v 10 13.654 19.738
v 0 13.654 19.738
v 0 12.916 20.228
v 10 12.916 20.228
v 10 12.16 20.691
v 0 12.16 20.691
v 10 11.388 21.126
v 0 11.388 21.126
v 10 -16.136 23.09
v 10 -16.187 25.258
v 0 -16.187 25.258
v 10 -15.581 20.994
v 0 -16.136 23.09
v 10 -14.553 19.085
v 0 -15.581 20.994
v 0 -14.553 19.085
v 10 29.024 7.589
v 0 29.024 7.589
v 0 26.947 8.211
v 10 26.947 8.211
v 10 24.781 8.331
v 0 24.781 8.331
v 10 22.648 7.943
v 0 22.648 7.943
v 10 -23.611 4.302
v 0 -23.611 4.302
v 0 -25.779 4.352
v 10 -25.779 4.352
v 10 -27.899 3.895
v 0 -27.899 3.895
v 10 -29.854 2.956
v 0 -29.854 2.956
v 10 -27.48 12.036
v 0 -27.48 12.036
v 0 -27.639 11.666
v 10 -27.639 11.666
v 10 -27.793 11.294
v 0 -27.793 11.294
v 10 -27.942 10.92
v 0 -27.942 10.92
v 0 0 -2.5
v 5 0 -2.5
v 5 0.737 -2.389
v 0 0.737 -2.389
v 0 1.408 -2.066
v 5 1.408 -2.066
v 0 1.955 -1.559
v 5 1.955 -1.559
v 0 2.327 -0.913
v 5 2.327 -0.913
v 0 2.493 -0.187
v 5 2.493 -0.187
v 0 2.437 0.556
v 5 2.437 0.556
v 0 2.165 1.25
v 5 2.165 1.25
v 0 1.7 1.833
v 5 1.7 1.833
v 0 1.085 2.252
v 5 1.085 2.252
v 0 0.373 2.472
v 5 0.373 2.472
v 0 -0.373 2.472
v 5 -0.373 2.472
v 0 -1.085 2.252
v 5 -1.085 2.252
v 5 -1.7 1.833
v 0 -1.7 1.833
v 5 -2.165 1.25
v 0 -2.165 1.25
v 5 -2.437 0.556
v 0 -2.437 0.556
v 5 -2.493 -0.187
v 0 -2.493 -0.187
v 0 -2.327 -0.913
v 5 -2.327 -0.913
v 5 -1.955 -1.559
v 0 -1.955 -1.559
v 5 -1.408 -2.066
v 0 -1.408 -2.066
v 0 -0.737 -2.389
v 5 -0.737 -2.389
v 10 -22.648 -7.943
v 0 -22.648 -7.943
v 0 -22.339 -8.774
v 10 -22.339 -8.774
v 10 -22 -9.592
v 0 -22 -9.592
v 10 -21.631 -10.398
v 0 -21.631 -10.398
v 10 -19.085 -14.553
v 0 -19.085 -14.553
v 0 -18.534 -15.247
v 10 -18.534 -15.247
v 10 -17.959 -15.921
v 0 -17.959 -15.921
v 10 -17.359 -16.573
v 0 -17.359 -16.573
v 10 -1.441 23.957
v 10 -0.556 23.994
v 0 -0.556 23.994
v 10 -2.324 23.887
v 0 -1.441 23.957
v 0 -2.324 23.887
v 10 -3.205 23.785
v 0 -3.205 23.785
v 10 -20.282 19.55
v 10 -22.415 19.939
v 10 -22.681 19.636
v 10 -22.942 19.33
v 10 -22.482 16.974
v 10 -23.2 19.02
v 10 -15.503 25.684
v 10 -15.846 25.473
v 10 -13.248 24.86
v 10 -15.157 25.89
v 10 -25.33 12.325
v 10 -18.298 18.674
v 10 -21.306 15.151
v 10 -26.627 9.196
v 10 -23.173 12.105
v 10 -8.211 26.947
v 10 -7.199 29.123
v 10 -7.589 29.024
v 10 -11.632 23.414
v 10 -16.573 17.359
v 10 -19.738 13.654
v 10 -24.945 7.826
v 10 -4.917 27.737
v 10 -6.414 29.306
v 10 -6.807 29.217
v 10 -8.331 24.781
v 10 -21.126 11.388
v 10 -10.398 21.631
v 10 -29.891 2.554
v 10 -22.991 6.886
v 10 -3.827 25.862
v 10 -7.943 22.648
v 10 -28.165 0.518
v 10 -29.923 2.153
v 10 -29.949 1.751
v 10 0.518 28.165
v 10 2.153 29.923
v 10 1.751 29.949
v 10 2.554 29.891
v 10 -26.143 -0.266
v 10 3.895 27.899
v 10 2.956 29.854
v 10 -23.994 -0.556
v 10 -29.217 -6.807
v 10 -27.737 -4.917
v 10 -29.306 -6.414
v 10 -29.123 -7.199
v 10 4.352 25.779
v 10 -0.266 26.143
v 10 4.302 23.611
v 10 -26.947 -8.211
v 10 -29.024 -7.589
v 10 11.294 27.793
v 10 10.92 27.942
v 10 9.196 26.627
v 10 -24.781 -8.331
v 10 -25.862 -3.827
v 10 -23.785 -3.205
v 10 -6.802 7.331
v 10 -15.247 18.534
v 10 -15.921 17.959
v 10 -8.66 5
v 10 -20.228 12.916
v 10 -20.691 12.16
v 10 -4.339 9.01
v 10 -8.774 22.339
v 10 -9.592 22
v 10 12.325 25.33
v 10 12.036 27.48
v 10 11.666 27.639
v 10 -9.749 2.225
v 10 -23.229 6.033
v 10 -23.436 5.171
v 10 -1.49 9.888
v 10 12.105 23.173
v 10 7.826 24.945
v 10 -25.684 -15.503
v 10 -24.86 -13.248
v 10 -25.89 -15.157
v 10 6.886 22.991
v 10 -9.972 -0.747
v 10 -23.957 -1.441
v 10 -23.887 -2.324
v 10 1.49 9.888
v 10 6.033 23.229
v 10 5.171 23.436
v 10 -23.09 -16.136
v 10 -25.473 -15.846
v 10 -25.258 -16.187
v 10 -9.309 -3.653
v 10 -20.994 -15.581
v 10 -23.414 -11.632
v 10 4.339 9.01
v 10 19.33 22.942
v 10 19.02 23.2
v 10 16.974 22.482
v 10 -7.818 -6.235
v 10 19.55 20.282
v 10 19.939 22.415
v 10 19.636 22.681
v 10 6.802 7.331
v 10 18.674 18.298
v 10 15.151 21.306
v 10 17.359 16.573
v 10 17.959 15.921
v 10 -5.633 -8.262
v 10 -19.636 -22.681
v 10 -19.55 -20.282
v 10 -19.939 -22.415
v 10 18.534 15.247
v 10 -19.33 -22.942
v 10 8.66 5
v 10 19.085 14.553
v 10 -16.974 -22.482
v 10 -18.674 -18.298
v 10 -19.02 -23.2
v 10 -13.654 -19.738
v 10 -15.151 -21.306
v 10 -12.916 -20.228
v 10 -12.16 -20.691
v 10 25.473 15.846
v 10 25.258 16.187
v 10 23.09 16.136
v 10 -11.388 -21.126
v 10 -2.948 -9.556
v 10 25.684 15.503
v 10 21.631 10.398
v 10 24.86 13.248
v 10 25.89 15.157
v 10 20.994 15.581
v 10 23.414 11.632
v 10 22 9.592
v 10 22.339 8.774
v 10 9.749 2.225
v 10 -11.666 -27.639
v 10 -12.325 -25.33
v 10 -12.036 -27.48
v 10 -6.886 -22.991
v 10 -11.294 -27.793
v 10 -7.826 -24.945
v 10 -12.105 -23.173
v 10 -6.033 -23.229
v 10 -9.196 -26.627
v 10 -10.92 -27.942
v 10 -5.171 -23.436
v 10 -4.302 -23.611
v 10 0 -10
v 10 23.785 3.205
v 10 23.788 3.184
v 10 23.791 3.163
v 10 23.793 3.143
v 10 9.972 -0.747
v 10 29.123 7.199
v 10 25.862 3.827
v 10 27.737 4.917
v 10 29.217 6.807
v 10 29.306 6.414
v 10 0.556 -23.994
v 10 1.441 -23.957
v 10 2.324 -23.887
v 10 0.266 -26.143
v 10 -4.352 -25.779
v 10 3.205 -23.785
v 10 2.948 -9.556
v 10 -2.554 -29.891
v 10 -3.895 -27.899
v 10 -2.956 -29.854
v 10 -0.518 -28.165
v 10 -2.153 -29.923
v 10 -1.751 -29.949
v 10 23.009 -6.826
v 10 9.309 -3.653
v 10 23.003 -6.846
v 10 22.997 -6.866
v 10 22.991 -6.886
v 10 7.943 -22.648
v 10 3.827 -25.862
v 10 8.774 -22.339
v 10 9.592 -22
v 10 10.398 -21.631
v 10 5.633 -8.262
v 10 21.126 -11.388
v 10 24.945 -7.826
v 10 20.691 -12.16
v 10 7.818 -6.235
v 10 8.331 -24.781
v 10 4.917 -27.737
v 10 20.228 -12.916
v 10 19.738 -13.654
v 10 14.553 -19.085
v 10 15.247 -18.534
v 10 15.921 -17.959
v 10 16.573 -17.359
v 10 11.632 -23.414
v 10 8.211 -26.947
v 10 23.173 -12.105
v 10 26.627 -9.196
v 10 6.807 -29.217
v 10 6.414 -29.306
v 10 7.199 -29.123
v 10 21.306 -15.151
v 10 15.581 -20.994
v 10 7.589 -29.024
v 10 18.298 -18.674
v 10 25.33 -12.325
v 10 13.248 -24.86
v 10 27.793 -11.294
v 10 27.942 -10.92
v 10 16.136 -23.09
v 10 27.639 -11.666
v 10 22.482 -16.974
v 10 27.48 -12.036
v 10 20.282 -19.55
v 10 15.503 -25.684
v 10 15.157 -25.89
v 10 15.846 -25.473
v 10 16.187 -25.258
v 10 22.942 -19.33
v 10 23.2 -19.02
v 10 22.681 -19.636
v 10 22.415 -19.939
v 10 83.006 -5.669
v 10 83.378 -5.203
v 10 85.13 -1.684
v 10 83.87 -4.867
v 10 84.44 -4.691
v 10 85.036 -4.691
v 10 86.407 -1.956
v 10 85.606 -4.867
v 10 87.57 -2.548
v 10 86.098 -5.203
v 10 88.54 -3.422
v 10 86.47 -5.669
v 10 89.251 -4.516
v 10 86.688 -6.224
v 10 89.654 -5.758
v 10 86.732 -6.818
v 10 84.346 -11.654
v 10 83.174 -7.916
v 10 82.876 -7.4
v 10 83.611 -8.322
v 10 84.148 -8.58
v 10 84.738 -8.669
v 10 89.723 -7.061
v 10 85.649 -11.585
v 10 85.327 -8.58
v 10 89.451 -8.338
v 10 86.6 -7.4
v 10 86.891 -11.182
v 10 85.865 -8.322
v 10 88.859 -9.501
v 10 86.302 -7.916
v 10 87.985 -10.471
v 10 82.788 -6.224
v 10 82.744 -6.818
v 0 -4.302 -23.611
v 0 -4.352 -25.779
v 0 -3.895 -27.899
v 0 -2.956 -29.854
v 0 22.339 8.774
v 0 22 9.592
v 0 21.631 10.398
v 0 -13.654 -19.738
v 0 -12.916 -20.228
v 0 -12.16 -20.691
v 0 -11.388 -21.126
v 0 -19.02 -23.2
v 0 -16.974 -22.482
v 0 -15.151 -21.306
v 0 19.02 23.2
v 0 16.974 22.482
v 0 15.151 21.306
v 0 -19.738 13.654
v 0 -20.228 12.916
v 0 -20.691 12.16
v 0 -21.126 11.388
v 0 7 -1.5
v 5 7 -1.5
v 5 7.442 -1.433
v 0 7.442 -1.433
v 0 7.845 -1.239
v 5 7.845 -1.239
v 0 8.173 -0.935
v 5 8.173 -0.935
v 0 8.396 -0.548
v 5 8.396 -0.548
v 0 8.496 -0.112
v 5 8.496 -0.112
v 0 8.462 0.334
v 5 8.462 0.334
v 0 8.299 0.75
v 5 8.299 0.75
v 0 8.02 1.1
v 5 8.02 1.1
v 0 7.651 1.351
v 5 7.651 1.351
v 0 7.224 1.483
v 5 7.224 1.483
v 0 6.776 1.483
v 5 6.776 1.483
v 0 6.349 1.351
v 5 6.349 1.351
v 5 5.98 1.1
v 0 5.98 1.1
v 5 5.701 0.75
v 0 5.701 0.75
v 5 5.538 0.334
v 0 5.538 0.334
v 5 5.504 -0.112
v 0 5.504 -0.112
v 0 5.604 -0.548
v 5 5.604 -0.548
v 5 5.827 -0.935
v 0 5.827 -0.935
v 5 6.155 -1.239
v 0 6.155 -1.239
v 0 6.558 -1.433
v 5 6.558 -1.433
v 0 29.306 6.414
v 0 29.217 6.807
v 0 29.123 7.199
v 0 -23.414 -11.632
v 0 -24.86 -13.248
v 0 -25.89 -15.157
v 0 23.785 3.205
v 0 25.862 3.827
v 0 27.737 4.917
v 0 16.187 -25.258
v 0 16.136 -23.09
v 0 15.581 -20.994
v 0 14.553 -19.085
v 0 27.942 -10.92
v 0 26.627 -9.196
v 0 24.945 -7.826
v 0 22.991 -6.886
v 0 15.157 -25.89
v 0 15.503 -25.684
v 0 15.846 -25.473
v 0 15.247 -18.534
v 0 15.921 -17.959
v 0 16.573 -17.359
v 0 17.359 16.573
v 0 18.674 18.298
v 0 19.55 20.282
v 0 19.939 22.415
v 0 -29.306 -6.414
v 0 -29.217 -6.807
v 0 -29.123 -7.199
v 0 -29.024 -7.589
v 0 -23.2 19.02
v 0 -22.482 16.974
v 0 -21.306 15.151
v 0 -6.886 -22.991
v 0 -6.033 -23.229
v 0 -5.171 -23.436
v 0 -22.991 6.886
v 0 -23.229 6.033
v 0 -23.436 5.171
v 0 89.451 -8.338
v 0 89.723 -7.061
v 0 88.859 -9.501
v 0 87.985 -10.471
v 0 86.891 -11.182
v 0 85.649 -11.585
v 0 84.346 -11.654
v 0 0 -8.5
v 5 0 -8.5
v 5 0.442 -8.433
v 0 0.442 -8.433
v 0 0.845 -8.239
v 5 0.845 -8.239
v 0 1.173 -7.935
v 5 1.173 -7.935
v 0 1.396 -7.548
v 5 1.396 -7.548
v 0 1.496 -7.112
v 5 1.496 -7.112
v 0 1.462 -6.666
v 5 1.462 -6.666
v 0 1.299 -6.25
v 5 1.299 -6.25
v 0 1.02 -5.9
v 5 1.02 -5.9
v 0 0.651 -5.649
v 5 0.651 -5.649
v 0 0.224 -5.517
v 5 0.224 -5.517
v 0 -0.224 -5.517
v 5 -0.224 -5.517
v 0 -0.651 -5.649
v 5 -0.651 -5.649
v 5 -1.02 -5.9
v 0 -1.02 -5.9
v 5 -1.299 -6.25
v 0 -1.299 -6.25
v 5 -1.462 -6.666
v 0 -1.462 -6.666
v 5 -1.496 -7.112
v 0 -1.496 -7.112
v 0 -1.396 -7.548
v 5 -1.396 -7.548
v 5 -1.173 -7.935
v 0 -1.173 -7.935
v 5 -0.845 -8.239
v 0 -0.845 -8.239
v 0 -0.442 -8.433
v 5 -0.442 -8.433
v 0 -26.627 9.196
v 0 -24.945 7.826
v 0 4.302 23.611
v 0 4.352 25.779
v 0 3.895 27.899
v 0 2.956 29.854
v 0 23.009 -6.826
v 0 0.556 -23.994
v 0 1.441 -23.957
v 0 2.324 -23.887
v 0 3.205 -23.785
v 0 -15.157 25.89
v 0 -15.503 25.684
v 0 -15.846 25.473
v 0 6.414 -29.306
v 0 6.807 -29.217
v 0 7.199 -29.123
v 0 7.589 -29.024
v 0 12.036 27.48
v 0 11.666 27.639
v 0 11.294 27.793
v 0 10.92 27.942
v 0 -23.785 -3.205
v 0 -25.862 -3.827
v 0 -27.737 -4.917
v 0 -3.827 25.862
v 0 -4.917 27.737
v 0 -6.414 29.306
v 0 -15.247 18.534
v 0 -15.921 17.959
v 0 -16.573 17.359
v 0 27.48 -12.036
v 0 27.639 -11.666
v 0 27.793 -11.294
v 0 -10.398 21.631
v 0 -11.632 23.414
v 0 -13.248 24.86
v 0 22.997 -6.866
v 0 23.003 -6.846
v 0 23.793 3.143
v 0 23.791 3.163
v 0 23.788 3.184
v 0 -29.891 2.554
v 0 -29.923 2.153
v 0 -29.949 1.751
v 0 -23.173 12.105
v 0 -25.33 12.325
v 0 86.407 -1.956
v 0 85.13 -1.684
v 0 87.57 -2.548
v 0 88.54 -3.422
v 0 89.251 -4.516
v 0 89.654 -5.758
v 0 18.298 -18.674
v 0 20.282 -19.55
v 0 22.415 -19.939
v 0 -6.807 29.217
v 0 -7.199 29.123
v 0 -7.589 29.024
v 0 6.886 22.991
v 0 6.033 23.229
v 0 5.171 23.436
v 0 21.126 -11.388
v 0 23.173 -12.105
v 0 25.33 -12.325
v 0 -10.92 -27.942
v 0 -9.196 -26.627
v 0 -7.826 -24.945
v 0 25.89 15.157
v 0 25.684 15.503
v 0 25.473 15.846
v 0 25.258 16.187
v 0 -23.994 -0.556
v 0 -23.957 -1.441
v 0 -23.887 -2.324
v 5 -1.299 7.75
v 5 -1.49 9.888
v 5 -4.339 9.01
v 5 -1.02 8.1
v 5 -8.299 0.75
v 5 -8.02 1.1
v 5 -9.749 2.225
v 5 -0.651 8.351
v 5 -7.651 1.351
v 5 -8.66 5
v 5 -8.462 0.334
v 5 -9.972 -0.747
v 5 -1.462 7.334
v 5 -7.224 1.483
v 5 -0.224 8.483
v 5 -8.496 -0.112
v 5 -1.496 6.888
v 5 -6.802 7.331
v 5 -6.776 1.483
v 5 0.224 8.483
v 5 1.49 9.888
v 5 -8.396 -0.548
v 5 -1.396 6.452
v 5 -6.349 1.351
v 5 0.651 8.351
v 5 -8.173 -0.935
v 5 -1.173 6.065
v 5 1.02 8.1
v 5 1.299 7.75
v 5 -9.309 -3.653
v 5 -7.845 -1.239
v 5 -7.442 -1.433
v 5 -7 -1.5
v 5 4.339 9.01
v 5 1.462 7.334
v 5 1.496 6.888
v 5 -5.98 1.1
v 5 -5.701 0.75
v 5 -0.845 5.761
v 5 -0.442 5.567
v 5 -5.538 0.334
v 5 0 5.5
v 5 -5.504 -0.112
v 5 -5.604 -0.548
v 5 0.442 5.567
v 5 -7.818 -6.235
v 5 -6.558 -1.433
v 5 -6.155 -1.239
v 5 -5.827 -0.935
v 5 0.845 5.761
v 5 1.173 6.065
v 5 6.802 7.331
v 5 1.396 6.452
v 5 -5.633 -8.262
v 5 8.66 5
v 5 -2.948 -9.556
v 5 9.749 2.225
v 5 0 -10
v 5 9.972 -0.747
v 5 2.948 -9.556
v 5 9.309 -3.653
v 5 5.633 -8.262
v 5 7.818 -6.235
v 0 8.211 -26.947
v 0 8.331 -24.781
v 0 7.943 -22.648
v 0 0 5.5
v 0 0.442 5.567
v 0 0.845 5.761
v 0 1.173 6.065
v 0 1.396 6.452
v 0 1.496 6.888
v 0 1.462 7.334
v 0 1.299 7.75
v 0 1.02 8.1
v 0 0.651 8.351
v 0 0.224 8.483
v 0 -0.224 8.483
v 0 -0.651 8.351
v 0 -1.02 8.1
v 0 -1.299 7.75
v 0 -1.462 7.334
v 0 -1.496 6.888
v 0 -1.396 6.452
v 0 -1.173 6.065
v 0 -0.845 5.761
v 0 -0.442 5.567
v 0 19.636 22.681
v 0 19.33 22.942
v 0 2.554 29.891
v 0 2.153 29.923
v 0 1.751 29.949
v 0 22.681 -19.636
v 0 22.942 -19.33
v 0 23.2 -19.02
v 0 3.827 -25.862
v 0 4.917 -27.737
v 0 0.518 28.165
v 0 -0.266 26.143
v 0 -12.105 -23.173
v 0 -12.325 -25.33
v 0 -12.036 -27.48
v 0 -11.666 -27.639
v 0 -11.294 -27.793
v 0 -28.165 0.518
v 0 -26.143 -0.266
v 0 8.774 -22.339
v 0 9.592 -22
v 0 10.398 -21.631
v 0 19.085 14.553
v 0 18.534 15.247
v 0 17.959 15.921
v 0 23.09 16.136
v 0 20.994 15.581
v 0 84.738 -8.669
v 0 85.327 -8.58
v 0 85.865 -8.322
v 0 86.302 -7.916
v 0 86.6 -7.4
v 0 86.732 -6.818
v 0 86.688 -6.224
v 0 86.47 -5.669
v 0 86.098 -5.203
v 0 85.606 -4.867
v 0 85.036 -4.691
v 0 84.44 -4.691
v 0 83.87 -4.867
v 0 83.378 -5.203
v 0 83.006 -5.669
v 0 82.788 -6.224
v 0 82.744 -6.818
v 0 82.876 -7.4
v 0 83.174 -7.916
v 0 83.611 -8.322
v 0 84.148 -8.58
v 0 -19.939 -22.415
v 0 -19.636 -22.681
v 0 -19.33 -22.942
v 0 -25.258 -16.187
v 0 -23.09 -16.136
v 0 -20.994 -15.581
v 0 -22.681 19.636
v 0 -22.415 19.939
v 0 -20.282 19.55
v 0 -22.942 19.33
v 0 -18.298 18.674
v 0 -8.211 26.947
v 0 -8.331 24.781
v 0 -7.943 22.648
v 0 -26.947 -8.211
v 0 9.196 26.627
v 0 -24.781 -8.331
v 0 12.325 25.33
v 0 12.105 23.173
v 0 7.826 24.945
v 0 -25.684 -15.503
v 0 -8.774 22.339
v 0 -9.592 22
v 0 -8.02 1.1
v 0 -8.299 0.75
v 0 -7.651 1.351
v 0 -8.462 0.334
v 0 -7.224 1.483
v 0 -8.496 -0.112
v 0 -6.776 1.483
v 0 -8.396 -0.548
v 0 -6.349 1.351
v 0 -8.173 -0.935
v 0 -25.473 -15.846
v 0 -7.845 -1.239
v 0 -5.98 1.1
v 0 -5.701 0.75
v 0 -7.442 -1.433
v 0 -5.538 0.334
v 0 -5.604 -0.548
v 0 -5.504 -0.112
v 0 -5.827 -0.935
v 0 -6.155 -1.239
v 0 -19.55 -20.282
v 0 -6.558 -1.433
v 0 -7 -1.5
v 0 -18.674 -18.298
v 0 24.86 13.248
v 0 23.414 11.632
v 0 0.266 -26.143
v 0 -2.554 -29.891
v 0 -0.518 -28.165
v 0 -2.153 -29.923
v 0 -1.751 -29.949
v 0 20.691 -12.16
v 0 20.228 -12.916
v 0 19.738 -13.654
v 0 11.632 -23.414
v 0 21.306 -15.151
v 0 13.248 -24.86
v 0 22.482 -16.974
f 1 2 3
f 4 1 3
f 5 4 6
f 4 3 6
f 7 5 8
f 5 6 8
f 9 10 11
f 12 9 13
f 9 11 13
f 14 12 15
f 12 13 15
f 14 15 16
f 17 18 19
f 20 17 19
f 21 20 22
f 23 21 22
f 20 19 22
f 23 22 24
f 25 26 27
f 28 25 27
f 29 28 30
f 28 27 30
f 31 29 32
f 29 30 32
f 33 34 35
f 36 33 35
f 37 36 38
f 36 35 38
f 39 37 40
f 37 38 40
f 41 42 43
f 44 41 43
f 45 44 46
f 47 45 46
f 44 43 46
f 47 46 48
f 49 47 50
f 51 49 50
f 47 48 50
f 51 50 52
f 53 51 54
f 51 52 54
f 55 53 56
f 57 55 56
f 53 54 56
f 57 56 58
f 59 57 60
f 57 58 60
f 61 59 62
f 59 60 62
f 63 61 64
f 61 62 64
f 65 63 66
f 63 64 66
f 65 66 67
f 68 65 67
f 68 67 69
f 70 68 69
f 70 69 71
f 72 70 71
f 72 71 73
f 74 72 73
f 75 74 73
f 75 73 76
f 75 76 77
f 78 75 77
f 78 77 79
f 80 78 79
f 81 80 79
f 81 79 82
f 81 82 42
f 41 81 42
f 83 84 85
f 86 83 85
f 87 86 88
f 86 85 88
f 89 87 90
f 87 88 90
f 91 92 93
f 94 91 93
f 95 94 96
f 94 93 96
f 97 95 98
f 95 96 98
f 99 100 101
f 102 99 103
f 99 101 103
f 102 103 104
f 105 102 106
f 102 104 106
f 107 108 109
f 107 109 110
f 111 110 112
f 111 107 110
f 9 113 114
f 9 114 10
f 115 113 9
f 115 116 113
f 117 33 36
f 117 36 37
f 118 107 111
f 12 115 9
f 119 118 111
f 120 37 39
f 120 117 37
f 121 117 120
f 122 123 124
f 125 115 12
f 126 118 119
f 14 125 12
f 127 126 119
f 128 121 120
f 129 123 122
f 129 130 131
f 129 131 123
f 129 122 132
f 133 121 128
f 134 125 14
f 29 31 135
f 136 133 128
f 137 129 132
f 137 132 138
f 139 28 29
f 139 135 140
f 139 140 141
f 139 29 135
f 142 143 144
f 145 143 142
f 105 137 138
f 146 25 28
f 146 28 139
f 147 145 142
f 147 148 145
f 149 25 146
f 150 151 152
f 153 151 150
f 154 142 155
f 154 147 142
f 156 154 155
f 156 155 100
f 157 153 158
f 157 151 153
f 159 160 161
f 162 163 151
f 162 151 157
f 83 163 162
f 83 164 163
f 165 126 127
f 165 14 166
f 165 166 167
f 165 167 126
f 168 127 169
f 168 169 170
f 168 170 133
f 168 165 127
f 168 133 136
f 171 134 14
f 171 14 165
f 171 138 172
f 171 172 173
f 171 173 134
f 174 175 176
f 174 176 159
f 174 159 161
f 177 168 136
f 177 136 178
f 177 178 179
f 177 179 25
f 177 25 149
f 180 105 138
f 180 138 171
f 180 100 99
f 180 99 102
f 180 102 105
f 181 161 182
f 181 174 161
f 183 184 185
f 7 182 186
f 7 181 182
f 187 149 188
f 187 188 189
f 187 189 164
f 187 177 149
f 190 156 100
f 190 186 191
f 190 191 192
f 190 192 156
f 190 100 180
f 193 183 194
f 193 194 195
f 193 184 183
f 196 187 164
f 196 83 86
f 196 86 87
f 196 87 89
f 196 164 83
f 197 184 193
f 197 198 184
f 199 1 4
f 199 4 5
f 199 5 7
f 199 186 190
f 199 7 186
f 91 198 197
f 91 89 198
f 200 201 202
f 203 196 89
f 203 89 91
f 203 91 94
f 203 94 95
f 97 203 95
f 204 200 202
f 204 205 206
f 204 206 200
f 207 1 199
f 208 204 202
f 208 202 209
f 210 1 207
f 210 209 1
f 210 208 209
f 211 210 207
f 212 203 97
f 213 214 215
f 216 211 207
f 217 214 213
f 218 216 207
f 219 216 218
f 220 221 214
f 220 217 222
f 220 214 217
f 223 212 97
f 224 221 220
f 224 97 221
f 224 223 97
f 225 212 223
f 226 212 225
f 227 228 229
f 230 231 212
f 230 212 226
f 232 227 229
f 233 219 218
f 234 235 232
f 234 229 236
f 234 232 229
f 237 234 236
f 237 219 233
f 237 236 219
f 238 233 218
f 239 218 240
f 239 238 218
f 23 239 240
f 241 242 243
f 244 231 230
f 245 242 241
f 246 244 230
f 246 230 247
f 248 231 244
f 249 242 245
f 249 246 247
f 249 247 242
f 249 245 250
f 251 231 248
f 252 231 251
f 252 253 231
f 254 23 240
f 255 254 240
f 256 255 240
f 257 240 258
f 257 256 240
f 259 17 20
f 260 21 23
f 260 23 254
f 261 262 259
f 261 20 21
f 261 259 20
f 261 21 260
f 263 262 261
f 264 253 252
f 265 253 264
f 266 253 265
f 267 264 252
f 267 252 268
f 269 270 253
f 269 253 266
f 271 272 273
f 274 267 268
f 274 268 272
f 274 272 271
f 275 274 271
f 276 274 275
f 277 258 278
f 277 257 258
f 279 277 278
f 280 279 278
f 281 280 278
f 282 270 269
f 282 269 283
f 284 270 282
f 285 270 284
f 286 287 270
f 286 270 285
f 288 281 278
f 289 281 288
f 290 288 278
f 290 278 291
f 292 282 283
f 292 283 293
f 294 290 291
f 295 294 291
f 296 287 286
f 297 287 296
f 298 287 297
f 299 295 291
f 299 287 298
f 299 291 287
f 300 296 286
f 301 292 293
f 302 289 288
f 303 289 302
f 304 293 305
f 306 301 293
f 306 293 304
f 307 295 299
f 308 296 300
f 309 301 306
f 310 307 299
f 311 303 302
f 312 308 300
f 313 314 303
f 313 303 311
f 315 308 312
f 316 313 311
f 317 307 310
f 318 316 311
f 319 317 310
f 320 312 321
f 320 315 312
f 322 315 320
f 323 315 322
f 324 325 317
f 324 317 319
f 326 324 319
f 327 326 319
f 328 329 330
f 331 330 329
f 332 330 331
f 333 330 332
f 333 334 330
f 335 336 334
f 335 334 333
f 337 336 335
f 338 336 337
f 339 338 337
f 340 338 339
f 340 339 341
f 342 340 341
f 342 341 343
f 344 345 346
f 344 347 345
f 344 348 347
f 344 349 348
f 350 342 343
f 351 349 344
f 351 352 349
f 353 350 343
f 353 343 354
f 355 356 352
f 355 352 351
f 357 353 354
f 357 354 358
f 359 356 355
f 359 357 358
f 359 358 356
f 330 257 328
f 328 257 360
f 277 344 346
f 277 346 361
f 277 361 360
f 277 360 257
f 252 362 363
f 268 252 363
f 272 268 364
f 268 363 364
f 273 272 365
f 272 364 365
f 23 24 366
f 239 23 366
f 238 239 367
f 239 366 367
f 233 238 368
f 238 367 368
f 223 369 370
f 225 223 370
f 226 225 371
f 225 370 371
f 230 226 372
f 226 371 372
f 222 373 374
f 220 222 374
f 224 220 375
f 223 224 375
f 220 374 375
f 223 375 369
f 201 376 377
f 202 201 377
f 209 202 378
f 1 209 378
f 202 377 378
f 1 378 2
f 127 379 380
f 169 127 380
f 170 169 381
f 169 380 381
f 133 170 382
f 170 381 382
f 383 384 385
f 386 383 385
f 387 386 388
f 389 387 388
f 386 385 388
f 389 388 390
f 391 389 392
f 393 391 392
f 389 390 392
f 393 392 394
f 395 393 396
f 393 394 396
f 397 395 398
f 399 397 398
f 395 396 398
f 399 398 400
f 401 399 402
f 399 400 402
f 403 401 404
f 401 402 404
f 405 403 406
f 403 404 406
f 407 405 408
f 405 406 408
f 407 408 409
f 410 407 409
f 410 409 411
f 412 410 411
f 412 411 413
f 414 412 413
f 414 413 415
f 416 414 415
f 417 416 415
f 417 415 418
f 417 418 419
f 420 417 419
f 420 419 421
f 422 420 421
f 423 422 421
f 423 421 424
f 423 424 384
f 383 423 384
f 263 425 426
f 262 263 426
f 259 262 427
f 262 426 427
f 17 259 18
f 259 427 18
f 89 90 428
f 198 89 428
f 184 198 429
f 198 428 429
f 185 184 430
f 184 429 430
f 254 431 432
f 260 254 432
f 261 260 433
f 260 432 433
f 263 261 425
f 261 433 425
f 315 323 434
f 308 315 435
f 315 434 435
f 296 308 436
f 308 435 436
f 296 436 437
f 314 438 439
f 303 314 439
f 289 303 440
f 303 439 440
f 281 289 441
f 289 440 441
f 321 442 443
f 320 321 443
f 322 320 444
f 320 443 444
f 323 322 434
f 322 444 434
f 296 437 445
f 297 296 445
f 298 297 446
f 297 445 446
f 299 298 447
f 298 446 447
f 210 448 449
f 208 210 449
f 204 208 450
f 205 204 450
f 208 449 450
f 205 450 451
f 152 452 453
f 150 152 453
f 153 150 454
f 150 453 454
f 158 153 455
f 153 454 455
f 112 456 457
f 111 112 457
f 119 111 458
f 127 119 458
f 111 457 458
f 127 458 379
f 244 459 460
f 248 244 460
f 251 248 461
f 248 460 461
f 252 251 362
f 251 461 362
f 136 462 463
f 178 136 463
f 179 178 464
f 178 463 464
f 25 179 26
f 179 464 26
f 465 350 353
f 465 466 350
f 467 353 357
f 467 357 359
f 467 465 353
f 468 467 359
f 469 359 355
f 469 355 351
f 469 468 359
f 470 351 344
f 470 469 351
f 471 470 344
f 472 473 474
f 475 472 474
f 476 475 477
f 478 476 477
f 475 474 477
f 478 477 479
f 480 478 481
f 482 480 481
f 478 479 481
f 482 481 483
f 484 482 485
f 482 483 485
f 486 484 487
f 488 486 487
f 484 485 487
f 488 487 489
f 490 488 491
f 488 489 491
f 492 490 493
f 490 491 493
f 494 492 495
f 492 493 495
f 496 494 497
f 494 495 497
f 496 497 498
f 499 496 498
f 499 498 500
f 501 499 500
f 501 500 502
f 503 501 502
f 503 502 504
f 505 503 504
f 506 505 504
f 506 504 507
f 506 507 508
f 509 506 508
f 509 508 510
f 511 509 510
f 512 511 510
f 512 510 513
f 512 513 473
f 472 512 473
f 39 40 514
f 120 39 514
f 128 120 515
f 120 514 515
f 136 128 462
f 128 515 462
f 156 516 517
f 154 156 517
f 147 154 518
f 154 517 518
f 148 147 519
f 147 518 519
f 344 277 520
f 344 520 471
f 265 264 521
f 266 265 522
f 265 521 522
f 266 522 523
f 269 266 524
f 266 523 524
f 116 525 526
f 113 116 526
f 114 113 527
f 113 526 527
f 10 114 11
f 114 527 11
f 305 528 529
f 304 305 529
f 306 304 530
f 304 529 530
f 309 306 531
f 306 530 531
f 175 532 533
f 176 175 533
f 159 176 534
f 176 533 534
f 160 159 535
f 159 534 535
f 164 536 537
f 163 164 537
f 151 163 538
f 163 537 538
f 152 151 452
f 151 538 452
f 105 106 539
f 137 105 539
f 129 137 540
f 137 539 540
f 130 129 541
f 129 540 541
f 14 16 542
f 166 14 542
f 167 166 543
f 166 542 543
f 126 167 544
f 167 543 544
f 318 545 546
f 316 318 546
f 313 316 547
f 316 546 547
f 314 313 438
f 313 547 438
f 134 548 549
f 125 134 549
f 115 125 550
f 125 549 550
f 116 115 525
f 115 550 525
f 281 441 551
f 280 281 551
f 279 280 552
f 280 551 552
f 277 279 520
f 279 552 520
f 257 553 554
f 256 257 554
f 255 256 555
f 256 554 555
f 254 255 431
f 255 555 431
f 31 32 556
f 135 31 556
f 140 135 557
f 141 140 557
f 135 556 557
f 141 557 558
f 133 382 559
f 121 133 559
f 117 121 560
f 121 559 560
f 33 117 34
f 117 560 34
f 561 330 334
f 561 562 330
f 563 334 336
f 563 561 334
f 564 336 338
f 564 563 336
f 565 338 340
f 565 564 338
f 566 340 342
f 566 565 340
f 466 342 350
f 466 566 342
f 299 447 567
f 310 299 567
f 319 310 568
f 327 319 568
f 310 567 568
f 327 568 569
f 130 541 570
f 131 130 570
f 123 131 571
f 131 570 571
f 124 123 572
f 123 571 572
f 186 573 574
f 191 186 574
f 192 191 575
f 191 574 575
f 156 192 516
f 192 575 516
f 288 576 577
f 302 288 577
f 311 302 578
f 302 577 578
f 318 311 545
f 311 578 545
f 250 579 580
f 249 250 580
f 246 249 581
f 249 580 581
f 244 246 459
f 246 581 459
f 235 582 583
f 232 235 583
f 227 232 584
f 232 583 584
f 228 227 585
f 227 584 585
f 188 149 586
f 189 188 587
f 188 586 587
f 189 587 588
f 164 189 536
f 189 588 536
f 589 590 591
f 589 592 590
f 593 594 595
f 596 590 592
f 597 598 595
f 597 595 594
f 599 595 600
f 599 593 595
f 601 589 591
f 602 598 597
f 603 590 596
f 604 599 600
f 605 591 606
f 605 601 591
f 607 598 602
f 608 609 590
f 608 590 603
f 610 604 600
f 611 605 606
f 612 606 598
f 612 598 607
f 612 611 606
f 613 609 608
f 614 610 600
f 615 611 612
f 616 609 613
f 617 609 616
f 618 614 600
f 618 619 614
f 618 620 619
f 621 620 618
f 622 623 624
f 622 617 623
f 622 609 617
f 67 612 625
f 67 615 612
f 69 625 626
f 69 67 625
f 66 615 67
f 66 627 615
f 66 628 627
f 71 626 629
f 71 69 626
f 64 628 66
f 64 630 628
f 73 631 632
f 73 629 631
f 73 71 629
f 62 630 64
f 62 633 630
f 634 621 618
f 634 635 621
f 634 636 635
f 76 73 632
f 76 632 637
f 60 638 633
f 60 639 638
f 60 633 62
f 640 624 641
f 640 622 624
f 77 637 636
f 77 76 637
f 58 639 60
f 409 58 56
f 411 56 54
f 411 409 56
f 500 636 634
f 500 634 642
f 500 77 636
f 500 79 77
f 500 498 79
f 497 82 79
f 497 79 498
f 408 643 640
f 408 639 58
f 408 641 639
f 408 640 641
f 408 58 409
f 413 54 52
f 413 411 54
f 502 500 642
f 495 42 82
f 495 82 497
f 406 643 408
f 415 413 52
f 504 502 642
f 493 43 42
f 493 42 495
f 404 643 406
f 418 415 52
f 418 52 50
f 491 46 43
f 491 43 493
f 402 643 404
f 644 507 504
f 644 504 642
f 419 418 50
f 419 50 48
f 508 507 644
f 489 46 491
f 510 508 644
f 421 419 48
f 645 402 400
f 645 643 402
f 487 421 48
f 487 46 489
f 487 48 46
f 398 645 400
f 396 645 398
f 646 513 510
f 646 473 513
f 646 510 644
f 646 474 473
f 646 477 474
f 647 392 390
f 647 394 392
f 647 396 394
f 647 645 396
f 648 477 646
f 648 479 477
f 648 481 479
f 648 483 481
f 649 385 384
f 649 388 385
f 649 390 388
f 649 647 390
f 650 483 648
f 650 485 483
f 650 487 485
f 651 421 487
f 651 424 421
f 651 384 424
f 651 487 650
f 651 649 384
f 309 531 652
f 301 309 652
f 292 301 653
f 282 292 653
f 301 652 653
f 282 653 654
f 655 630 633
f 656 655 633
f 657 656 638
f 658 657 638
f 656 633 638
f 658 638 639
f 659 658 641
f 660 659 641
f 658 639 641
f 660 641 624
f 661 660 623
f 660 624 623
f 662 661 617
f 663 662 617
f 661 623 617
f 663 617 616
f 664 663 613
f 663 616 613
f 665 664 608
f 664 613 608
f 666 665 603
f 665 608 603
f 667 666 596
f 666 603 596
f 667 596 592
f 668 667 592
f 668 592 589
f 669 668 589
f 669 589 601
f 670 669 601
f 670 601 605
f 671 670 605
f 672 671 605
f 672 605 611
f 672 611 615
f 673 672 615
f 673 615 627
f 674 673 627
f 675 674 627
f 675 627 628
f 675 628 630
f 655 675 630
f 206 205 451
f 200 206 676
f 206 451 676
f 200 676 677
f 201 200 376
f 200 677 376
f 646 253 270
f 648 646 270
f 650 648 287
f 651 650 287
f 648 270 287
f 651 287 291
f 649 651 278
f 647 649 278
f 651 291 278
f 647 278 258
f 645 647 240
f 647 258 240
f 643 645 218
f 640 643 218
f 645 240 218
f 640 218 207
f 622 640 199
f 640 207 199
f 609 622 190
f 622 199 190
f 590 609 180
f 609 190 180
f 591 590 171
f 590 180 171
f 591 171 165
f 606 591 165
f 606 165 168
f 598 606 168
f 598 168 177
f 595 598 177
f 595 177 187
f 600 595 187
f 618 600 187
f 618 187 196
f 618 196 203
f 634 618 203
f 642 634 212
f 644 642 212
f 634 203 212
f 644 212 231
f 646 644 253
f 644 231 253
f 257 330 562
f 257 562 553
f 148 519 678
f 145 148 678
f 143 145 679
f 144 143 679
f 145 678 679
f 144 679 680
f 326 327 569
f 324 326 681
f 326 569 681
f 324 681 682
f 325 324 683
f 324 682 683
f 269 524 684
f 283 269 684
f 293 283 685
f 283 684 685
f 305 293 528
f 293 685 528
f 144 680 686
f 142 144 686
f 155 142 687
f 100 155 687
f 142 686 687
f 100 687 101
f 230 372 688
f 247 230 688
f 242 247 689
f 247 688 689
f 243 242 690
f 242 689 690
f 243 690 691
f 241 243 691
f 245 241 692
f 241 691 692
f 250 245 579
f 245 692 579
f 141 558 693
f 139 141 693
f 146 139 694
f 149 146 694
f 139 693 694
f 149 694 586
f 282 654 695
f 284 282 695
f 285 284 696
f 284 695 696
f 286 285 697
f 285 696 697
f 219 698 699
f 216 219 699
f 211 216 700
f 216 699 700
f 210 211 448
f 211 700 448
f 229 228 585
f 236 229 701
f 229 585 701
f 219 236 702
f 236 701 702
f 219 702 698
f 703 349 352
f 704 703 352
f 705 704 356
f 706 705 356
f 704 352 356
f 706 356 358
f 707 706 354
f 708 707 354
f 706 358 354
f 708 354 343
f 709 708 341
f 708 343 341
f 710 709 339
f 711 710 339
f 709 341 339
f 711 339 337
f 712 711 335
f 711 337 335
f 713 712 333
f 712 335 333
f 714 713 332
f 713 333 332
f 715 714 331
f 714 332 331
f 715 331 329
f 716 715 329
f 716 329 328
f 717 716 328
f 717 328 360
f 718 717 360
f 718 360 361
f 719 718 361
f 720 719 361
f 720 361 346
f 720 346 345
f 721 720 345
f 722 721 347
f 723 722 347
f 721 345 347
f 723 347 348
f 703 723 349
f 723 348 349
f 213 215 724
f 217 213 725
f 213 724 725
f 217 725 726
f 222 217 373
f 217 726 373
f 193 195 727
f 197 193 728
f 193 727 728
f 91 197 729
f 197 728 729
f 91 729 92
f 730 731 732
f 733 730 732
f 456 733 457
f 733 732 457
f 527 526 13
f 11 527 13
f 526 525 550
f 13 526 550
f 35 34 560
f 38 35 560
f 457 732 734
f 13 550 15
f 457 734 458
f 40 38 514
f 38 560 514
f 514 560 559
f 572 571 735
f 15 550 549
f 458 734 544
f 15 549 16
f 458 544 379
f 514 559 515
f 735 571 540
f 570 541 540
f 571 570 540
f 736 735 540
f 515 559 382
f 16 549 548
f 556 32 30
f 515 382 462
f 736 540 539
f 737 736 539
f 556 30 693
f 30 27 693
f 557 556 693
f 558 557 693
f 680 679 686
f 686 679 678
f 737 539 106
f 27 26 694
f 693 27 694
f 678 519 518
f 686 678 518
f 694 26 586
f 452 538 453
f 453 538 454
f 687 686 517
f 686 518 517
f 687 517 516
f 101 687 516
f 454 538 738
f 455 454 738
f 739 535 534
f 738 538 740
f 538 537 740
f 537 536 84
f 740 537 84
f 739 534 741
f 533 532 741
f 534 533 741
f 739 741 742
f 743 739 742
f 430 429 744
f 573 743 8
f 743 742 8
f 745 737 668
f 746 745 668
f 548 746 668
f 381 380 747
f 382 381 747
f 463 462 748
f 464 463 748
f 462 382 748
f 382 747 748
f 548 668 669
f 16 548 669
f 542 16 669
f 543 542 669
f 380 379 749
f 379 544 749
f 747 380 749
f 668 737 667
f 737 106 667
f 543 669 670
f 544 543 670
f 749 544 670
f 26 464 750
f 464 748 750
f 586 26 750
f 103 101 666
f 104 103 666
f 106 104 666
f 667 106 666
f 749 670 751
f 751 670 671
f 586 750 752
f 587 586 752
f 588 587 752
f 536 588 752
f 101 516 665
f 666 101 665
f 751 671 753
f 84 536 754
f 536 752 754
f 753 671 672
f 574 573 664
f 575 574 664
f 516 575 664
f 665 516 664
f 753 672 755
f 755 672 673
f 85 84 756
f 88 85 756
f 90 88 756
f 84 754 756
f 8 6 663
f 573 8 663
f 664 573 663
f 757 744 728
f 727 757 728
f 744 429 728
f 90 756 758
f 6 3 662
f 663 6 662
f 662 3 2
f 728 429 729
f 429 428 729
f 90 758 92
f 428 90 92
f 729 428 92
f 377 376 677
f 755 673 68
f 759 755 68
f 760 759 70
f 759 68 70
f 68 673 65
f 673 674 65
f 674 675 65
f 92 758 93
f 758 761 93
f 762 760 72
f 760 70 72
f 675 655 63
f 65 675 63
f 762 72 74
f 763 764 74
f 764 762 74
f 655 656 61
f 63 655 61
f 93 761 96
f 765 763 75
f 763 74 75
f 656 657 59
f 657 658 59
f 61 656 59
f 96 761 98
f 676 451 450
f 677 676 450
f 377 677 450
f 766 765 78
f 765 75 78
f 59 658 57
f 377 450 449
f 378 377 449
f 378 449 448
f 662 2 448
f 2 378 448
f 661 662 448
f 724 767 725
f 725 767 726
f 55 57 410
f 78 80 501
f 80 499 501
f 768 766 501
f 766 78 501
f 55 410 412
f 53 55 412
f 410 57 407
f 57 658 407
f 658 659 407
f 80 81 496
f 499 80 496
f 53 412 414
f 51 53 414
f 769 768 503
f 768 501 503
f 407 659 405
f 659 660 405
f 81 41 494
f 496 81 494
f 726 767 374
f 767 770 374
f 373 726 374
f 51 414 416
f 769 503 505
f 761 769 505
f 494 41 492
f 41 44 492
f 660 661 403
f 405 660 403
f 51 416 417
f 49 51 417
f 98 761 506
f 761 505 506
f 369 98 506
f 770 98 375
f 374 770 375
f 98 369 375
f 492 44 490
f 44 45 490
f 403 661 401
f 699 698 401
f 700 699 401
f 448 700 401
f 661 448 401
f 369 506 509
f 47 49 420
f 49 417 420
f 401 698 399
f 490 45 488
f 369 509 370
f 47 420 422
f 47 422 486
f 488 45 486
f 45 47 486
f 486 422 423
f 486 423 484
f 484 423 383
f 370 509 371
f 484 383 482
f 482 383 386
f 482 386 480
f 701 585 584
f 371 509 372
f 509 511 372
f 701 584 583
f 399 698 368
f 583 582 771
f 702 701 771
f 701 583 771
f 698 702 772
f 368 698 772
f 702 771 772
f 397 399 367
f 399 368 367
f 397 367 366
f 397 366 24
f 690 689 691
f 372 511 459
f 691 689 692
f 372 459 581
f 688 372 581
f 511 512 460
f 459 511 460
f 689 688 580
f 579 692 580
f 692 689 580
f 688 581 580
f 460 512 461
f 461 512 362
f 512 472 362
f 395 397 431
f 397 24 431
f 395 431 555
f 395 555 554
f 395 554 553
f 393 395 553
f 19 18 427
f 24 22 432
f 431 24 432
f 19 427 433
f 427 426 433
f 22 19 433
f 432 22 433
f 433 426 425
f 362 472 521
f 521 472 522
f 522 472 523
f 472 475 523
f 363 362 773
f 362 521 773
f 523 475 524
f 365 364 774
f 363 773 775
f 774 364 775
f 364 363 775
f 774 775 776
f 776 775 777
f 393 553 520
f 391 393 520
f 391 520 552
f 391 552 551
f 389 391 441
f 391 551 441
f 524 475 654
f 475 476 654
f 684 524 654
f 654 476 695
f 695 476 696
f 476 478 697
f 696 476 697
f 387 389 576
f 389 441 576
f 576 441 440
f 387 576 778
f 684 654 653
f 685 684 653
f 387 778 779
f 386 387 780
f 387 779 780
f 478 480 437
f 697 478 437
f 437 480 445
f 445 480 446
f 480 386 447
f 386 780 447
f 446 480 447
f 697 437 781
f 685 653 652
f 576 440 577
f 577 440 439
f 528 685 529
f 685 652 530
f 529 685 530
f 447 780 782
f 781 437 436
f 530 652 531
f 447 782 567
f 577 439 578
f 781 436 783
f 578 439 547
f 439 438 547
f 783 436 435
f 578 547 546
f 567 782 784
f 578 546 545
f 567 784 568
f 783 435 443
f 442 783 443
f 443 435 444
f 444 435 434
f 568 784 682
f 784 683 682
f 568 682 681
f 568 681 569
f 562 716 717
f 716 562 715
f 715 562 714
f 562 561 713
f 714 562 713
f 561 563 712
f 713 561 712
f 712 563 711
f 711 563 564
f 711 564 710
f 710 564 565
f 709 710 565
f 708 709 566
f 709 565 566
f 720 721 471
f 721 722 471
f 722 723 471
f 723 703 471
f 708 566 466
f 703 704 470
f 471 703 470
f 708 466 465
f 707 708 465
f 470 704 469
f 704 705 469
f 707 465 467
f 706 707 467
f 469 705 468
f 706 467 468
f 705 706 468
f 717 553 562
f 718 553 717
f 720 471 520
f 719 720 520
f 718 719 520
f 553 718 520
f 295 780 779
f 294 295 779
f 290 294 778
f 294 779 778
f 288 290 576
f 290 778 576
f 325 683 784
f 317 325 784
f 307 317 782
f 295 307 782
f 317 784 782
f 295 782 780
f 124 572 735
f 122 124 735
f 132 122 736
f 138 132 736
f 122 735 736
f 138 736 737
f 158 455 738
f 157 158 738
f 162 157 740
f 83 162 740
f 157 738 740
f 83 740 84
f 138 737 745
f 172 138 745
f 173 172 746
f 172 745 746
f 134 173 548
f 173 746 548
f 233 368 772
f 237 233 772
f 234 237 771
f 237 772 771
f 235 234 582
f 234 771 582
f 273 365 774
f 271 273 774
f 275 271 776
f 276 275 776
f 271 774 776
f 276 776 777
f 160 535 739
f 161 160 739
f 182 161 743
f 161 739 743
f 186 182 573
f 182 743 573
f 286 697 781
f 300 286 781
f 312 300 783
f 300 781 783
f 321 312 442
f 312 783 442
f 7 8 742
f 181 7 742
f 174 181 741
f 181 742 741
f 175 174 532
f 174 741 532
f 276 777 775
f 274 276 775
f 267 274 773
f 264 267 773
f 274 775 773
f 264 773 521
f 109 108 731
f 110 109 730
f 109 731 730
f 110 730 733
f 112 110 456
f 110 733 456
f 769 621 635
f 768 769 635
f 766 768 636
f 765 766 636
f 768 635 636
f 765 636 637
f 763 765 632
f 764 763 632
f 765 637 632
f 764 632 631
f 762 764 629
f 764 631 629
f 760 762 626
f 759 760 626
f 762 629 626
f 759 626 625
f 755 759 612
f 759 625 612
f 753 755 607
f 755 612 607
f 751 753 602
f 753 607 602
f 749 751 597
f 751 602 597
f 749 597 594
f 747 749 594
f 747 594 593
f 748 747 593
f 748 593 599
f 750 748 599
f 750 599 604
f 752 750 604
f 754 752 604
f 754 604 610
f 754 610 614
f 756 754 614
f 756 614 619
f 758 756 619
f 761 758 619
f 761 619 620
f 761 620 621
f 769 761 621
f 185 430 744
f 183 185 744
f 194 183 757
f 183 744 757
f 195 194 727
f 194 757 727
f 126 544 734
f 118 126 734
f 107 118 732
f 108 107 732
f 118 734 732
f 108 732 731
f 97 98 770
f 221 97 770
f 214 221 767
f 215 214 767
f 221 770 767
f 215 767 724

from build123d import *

# Parameters (mm, degrees)
EXTRUDE_1_DEPTH     = 10
EXTRUDE_2_DEPTH     = 10
FILLET_1_R          = 5
SKETCH_3_R          = 2.5
CUT_EXTRUDE_1_DEPTH = 10
SKETCH_4_R          = 2
CUT_EXTRUDE_2_DEPTH = 10
SKETCH_5_R          = 1.5
CUT_EXTRUDE_3_DEPTH = 10
SKETCH_6_R          = 10
CUT_EXTRUDE_4_DEPTH = 5


with BuildPart() as part:
    # 草图1 → 凸台-拉伸1 (new body)
    with BuildSketch(Plane(origin=(0, 0, 0), x_dir=(0, 0, -1), z_dir=(1, 0, 0))):
        with BuildLine():
            ThreePointArc((-7.942884534, 22.647529341), (-9.184402377, 22.17310878), (-10.397754058, 21.630689091))
            ThreePointArc((-10.397754058, 21.630689091), (-12.397305949, 24.184674774), (-15.156649968, 25.889688329))
            ThreePointArc((-15.156649968, 25.889688329), (-15.674956941, 25.579204931), (-16.186906117, 25.258346549))
            ThreePointArc((-16.186906117, 25.258346549), (-15.920443886, 22.02569307), (-14.552603542, 19.084594053))
            ThreePointArc((-14.552603542, 19.084594053), (-15.58675316, 18.249743174), (-16.573102281, 17.358925105))
            ThreePointArc((-16.573102281, 17.358925105), (-19.264014116, 19.170014316), (-22.41518439, 19.938894372))
            ThreePointArc((-22.41518439, 19.938894372), (-22.812178968, 19.48344145), (-23.199920874, 19.020085999))
            ThreePointArc((-23.199920874, 19.020085999), (-21.947555371, 16.027991201), (-19.737812321, 13.653525728))
            ThreePointArc((-19.737812321, 13.653525728), (-20.463363944, 12.539965553), (-21.126159781, 11.387948582))
            ThreePointArc((-21.126159781, 11.387948582), (-24.245026361, 12.278859291), (-27.479564388, 12.036342512))
            ThreePointArc((-27.479564388, 12.036342512), (-27.716385975, 11.480502971), (-27.941965733, 10.920006912))
            ThreePointArc((-27.941965733, 10.920006912), (-25.82628722, 8.46135788), (-22.990946508, 6.885955175))
            ThreePointArc((-22.990946508, 6.885955175), (-23.33687809, 5.602688733), (-23.611241567, 4.302240308))
            ThreePointArc((-23.611241567, 4.302240308), (-26.852766501, 4.185763967), (-29.854053162, 2.955589584))
            ThreePointArc((-29.854053162, 2.955589584), (-29.907520012, 2.353772872), (-29.948856303, 1.751001464))
            ThreePointArc((-29.948856303, 1.751001464), (-27.176962132, 0.066467896), (-23.993566664, -0.555660648))
            ThreePointArc((-23.993566664, -0.555660648), (-23.92601601, -1.883018297), (-23.785090519, -3.204601222))
            ThreePointArc((-23.785090519, -3.204601222), (-26.831970761, -4.317063099), (-29.306219208, -6.414477044))
            ThreePointArc((-29.306219208, -6.414477044), (-29.171097612, -7.003360916), (-29.024144152, -7.589404208))
            ThreePointArc((-29.024144152, -7.589404208), (-25.867366639, -8.334928429), (-22.647529341, -7.942884534))
            ThreePointArc((-22.647529341, -7.942884534), (-22.17310878, -9.184402377), (-21.630689091, -10.397754058))
            ThreePointArc((-21.630689091, -10.397754058), (-24.184674774, -12.397305949), (-25.889688329, -15.156649968))
            ThreePointArc((-25.889688329, -15.156649968), (-25.579204931, -15.674956941), (-25.258346549, -16.186906117))
            ThreePointArc((-25.258346549, -16.186906117), (-22.02569307, -15.920443886), (-19.084594053, -14.552603542))
            ThreePointArc((-19.084594053, -14.552603542), (-18.249743174, -15.58675316), (-17.358925105, -16.573102281))
            ThreePointArc((-17.358925105, -16.573102281), (-19.170014316, -19.264014116), (-19.938894372, -22.41518439))
            ThreePointArc((-19.938894372, -22.41518439), (-19.48344145, -22.812178968), (-19.020085999, -23.199920874))
            ThreePointArc((-19.020085999, -23.199920874), (-16.027991201, -21.947555371), (-13.653525728, -19.737812321))
            ThreePointArc((-13.653525728, -19.737812321), (-12.539965553, -20.463363944), (-11.387948582, -21.126159781))
            ThreePointArc((-11.387948582, -21.126159781), (-12.278859291, -24.245026361), (-12.036342512, -27.479564388))
            ThreePointArc((-12.036342512, -27.479564388), (-11.480502971, -27.716385975), (-10.920006912, -27.941965733))
            ThreePointArc((-10.920006912, -27.941965733), (-8.46135788, -25.82628722), (-6.885955175, -22.990946508))
            ThreePointArc((-6.885955175, -22.990946508), (-5.602688733, -23.33687809), (-4.302240308, -23.611241567))
            ThreePointArc((-4.302240308, -23.611241567), (-4.185763967, -26.852766501), (-2.955589584, -29.854053162))
            ThreePointArc((-2.955589584, -29.854053162), (-2.353772872, -29.907520012), (-1.751001464, -29.948856303))
            ThreePointArc((-1.751001464, -29.948856303), (-0.066467896, -27.176962132), (0.555660648, -23.993566664))
            ThreePointArc((0.555660648, -23.993566664), (1.883018297, -23.92601601), (3.204601222, -23.785090519))
            ThreePointArc((3.204601222, -23.785090519), (4.317063099, -26.831970761), (6.414477044, -29.306219208))
            ThreePointArc((6.414477044, -29.306219208), (7.003360916, -29.171097612), (7.589404208, -29.024144152))
            ThreePointArc((7.589404208, -29.024144152), (8.334928429, -25.867366639), (7.942884534, -22.647529341))
            ThreePointArc((7.942884534, -22.647529341), (9.184402377, -22.17310878), (10.397754058, -21.630689091))
            ThreePointArc((10.397754058, -21.630689091), (12.397305949, -24.184674774), (15.156649968, -25.889688329))
            ThreePointArc((15.156649968, -25.889688329), (15.674956941, -25.579204931), (16.186906117, -25.258346549))
            ThreePointArc((16.186906117, -25.258346549), (15.920443886, -22.02569307), (14.552603542, -19.084594053))
            ThreePointArc((14.552603542, -19.084594053), (15.58675316, -18.249743174), (16.573102281, -17.358925105))
            ThreePointArc((16.573102281, -17.358925105), (19.264014116, -19.170014316), (22.41518439, -19.938894372))
            ThreePointArc((22.41518439, -19.938894372), (22.812178968, -19.48344145), (23.199920874, -19.020085999))
            ThreePointArc((23.199920874, -19.020085999), (21.947555371, -16.027991201), (19.737812321, -13.653525728))
            ThreePointArc((19.737812321, -13.653525728), (20.463363944, -12.539965553), (21.126159781, -11.387948582))
            ThreePointArc((21.126159781, -11.387948582), (24.245026361, -12.278859291), (27.479564388, -12.036342512))
            ThreePointArc((27.479564388, -12.036342512), (27.716385975, -11.480502971), (27.941965733, -10.920006912))
            ThreePointArc((27.941965733, -10.920006912), (25.82628722, -8.46135788), (22.990946508, -6.885955175))
            ThreePointArc((22.990946508, -6.885955175), (23.33687809, -5.602688733), (23.611241567, -4.302240308))
            ThreePointArc((23.611241567, -4.302240308), (26.852766501, -4.185763967), (29.854053162, -2.955589584))
            ThreePointArc((29.854053162, -2.955589584), (29.907520012, -2.353772872), (29.948856303, -1.751001464))
            ThreePointArc((29.948856303, -1.751001464), (27.176962132, -0.066467896), (23.993566664, 0.555660648))
            ThreePointArc((23.993566664, 0.555660648), (23.92601601, 1.883018297), (23.785090519, 3.204601222))
            ThreePointArc((23.785090519, 3.204601222), (26.831970761, 4.317063099), (29.306219208, 6.414477044))
            ThreePointArc((29.306219208, 6.414477044), (29.171097612, 7.003360916), (29.024144152, 7.589404208))
            ThreePointArc((29.024144152, 7.589404208), (25.867366639, 8.334928429), (22.647529341, 7.942884534))
            ThreePointArc((22.647529341, 7.942884534), (22.17310878, 9.184402377), (21.630689091, 10.397754058))
            ThreePointArc((21.630689091, 10.397754058), (24.184674774, 12.397305949), (25.889688329, 15.156649968))
            ThreePointArc((25.889688329, 15.156649968), (25.579204931, 15.674956941), (25.258346549, 16.186906117))
            ThreePointArc((25.258346549, 16.186906117), (22.02569307, 15.920443886), (19.084594053, 14.552603542))
            ThreePointArc((19.084594053, 14.552603542), (18.249743174, 15.58675316), (17.358925105, 16.573102281))
            ThreePointArc((17.358925105, 16.573102281), (19.170014316, 19.264014116), (19.938894372, 22.41518439))
            ThreePointArc((19.938894372, 22.41518439), (19.48344145, 22.812178968), (19.020085999, 23.199920874))
            ThreePointArc((19.020085999, 23.199920874), (16.027991201, 21.947555371), (13.653525728, 19.737812321))
            ThreePointArc((13.653525728, 19.737812321), (12.539965553, 20.463363944), (11.387948582, 21.126159781))
            ThreePointArc((11.387948582, 21.126159781), (12.278859291, 24.245026361), (12.036342512, 27.479564388))
            ThreePointArc((12.036342512, 27.479564388), (11.480502971, 27.716385975), (10.920006912, 27.941965733))
            ThreePointArc((10.920006912, 27.941965733), (8.46135788, 25.82628722), (6.885955175, 22.990946508))
            ThreePointArc((6.885955175, 22.990946508), (5.602688733, 23.33687809), (4.302240308, 23.611241567))
            ThreePointArc((4.302240308, 23.611241567), (4.185763967, 26.852766501), (2.955589584, 29.854053162))
            ThreePointArc((2.955589584, 29.854053162), (2.353772872, 29.907520012), (1.751001464, 29.948856303))
            ThreePointArc((1.751001464, 29.948856303), (0.066467896, 27.176962132), (-0.555660648, 23.993566664))
            ThreePointArc((-0.555660648, 23.993566664), (-1.883018297, 23.92601601), (-3.204601222, 23.785090519))
            ThreePointArc((-3.204601222, 23.785090519), (-4.317063099, 26.831970761), (-6.414477044, 29.306219208))
            ThreePointArc((-6.414477044, 29.306219208), (-7.003360916, 29.171097612), (-7.589404208, 29.024144152))
            ThreePointArc((-7.589404208, 29.024144152), (-8.334928429, 25.867366639), (-7.942884534, 22.647529341))
        make_face()
    extrude(amount=EXTRUDE_1_DEPTH)

    # 草图2 → 凸台-拉伸2 (add)
    with BuildSketch(Plane(origin=(10, 0, 0), x_dir=(0, 0, -1), z_dir=(1, 0, 0))):
        Polygon((2.076731947, 90.114855515), (-4.984586669, 0.392295479), (4.984586669, -0.392295479), (12.045905284, 89.330264557), align=None)
    extrude(amount=-EXTRUDE_2_DEPTH)

    # 圆角1
    fillet_1_edges = [part.edges().sort_by_distance(p)[0] for p in [
        (5, 89.330264557, -12.045905284),
        (5, 90.114855515, -2.076731947),
    ]]
    fillet(fillet_1_edges, radius=FILLET_1_R - 0.0001)  # a hair under: the kernel refuses the full size

    # 草图3 → 切除-拉伸1 (cut)
    with BuildSketch(Plane(origin=(10, 0, 0), x_dir=(0, 0, -1), z_dir=(1, 0, 0))):
        Circle(SKETCH_3_R)
    extrude(amount=-CUT_EXTRUDE_1_DEPTH, mode=Mode.SUBTRACT)

    # 草图4 → 切除-拉伸2 (cut)
    with BuildSketch(Plane(origin=(10, 0, 0), x_dir=(0, 0, -1), z_dir=(1, 0, 0))):
        with Locations((6.669023137, 84.737973367)):
            Circle(SKETCH_4_R)
    extrude(amount=-CUT_EXTRUDE_2_DEPTH, mode=Mode.SUBTRACT)

    # 草图5 → 切除-拉伸3 (cut)
    with BuildSketch(Plane(origin=(10, 0, 0), x_dir=(0, 0, -1), z_dir=(1, 0, 0))):
        with Locations((0, 7)):
            Circle(SKETCH_5_R)
        with Locations((7, 0)):
            Circle(SKETCH_5_R)
        with Locations((0, -7)):
            Circle(SKETCH_5_R)
        with Locations((-7, 0)):
            Circle(SKETCH_5_R)
    extrude(amount=-CUT_EXTRUDE_3_DEPTH, mode=Mode.SUBTRACT)

    # 草图6 → 切除-拉伸4 (cut)
    with BuildSketch(Plane(origin=(10, 0, 0), x_dir=(0, 0, -1), z_dir=(1, 0, 0))):
        Circle(SKETCH_6_R)
    extrude(amount=-CUT_EXTRUDE_4_DEPTH, mode=Mode.SUBTRACT)


solid = part.part
